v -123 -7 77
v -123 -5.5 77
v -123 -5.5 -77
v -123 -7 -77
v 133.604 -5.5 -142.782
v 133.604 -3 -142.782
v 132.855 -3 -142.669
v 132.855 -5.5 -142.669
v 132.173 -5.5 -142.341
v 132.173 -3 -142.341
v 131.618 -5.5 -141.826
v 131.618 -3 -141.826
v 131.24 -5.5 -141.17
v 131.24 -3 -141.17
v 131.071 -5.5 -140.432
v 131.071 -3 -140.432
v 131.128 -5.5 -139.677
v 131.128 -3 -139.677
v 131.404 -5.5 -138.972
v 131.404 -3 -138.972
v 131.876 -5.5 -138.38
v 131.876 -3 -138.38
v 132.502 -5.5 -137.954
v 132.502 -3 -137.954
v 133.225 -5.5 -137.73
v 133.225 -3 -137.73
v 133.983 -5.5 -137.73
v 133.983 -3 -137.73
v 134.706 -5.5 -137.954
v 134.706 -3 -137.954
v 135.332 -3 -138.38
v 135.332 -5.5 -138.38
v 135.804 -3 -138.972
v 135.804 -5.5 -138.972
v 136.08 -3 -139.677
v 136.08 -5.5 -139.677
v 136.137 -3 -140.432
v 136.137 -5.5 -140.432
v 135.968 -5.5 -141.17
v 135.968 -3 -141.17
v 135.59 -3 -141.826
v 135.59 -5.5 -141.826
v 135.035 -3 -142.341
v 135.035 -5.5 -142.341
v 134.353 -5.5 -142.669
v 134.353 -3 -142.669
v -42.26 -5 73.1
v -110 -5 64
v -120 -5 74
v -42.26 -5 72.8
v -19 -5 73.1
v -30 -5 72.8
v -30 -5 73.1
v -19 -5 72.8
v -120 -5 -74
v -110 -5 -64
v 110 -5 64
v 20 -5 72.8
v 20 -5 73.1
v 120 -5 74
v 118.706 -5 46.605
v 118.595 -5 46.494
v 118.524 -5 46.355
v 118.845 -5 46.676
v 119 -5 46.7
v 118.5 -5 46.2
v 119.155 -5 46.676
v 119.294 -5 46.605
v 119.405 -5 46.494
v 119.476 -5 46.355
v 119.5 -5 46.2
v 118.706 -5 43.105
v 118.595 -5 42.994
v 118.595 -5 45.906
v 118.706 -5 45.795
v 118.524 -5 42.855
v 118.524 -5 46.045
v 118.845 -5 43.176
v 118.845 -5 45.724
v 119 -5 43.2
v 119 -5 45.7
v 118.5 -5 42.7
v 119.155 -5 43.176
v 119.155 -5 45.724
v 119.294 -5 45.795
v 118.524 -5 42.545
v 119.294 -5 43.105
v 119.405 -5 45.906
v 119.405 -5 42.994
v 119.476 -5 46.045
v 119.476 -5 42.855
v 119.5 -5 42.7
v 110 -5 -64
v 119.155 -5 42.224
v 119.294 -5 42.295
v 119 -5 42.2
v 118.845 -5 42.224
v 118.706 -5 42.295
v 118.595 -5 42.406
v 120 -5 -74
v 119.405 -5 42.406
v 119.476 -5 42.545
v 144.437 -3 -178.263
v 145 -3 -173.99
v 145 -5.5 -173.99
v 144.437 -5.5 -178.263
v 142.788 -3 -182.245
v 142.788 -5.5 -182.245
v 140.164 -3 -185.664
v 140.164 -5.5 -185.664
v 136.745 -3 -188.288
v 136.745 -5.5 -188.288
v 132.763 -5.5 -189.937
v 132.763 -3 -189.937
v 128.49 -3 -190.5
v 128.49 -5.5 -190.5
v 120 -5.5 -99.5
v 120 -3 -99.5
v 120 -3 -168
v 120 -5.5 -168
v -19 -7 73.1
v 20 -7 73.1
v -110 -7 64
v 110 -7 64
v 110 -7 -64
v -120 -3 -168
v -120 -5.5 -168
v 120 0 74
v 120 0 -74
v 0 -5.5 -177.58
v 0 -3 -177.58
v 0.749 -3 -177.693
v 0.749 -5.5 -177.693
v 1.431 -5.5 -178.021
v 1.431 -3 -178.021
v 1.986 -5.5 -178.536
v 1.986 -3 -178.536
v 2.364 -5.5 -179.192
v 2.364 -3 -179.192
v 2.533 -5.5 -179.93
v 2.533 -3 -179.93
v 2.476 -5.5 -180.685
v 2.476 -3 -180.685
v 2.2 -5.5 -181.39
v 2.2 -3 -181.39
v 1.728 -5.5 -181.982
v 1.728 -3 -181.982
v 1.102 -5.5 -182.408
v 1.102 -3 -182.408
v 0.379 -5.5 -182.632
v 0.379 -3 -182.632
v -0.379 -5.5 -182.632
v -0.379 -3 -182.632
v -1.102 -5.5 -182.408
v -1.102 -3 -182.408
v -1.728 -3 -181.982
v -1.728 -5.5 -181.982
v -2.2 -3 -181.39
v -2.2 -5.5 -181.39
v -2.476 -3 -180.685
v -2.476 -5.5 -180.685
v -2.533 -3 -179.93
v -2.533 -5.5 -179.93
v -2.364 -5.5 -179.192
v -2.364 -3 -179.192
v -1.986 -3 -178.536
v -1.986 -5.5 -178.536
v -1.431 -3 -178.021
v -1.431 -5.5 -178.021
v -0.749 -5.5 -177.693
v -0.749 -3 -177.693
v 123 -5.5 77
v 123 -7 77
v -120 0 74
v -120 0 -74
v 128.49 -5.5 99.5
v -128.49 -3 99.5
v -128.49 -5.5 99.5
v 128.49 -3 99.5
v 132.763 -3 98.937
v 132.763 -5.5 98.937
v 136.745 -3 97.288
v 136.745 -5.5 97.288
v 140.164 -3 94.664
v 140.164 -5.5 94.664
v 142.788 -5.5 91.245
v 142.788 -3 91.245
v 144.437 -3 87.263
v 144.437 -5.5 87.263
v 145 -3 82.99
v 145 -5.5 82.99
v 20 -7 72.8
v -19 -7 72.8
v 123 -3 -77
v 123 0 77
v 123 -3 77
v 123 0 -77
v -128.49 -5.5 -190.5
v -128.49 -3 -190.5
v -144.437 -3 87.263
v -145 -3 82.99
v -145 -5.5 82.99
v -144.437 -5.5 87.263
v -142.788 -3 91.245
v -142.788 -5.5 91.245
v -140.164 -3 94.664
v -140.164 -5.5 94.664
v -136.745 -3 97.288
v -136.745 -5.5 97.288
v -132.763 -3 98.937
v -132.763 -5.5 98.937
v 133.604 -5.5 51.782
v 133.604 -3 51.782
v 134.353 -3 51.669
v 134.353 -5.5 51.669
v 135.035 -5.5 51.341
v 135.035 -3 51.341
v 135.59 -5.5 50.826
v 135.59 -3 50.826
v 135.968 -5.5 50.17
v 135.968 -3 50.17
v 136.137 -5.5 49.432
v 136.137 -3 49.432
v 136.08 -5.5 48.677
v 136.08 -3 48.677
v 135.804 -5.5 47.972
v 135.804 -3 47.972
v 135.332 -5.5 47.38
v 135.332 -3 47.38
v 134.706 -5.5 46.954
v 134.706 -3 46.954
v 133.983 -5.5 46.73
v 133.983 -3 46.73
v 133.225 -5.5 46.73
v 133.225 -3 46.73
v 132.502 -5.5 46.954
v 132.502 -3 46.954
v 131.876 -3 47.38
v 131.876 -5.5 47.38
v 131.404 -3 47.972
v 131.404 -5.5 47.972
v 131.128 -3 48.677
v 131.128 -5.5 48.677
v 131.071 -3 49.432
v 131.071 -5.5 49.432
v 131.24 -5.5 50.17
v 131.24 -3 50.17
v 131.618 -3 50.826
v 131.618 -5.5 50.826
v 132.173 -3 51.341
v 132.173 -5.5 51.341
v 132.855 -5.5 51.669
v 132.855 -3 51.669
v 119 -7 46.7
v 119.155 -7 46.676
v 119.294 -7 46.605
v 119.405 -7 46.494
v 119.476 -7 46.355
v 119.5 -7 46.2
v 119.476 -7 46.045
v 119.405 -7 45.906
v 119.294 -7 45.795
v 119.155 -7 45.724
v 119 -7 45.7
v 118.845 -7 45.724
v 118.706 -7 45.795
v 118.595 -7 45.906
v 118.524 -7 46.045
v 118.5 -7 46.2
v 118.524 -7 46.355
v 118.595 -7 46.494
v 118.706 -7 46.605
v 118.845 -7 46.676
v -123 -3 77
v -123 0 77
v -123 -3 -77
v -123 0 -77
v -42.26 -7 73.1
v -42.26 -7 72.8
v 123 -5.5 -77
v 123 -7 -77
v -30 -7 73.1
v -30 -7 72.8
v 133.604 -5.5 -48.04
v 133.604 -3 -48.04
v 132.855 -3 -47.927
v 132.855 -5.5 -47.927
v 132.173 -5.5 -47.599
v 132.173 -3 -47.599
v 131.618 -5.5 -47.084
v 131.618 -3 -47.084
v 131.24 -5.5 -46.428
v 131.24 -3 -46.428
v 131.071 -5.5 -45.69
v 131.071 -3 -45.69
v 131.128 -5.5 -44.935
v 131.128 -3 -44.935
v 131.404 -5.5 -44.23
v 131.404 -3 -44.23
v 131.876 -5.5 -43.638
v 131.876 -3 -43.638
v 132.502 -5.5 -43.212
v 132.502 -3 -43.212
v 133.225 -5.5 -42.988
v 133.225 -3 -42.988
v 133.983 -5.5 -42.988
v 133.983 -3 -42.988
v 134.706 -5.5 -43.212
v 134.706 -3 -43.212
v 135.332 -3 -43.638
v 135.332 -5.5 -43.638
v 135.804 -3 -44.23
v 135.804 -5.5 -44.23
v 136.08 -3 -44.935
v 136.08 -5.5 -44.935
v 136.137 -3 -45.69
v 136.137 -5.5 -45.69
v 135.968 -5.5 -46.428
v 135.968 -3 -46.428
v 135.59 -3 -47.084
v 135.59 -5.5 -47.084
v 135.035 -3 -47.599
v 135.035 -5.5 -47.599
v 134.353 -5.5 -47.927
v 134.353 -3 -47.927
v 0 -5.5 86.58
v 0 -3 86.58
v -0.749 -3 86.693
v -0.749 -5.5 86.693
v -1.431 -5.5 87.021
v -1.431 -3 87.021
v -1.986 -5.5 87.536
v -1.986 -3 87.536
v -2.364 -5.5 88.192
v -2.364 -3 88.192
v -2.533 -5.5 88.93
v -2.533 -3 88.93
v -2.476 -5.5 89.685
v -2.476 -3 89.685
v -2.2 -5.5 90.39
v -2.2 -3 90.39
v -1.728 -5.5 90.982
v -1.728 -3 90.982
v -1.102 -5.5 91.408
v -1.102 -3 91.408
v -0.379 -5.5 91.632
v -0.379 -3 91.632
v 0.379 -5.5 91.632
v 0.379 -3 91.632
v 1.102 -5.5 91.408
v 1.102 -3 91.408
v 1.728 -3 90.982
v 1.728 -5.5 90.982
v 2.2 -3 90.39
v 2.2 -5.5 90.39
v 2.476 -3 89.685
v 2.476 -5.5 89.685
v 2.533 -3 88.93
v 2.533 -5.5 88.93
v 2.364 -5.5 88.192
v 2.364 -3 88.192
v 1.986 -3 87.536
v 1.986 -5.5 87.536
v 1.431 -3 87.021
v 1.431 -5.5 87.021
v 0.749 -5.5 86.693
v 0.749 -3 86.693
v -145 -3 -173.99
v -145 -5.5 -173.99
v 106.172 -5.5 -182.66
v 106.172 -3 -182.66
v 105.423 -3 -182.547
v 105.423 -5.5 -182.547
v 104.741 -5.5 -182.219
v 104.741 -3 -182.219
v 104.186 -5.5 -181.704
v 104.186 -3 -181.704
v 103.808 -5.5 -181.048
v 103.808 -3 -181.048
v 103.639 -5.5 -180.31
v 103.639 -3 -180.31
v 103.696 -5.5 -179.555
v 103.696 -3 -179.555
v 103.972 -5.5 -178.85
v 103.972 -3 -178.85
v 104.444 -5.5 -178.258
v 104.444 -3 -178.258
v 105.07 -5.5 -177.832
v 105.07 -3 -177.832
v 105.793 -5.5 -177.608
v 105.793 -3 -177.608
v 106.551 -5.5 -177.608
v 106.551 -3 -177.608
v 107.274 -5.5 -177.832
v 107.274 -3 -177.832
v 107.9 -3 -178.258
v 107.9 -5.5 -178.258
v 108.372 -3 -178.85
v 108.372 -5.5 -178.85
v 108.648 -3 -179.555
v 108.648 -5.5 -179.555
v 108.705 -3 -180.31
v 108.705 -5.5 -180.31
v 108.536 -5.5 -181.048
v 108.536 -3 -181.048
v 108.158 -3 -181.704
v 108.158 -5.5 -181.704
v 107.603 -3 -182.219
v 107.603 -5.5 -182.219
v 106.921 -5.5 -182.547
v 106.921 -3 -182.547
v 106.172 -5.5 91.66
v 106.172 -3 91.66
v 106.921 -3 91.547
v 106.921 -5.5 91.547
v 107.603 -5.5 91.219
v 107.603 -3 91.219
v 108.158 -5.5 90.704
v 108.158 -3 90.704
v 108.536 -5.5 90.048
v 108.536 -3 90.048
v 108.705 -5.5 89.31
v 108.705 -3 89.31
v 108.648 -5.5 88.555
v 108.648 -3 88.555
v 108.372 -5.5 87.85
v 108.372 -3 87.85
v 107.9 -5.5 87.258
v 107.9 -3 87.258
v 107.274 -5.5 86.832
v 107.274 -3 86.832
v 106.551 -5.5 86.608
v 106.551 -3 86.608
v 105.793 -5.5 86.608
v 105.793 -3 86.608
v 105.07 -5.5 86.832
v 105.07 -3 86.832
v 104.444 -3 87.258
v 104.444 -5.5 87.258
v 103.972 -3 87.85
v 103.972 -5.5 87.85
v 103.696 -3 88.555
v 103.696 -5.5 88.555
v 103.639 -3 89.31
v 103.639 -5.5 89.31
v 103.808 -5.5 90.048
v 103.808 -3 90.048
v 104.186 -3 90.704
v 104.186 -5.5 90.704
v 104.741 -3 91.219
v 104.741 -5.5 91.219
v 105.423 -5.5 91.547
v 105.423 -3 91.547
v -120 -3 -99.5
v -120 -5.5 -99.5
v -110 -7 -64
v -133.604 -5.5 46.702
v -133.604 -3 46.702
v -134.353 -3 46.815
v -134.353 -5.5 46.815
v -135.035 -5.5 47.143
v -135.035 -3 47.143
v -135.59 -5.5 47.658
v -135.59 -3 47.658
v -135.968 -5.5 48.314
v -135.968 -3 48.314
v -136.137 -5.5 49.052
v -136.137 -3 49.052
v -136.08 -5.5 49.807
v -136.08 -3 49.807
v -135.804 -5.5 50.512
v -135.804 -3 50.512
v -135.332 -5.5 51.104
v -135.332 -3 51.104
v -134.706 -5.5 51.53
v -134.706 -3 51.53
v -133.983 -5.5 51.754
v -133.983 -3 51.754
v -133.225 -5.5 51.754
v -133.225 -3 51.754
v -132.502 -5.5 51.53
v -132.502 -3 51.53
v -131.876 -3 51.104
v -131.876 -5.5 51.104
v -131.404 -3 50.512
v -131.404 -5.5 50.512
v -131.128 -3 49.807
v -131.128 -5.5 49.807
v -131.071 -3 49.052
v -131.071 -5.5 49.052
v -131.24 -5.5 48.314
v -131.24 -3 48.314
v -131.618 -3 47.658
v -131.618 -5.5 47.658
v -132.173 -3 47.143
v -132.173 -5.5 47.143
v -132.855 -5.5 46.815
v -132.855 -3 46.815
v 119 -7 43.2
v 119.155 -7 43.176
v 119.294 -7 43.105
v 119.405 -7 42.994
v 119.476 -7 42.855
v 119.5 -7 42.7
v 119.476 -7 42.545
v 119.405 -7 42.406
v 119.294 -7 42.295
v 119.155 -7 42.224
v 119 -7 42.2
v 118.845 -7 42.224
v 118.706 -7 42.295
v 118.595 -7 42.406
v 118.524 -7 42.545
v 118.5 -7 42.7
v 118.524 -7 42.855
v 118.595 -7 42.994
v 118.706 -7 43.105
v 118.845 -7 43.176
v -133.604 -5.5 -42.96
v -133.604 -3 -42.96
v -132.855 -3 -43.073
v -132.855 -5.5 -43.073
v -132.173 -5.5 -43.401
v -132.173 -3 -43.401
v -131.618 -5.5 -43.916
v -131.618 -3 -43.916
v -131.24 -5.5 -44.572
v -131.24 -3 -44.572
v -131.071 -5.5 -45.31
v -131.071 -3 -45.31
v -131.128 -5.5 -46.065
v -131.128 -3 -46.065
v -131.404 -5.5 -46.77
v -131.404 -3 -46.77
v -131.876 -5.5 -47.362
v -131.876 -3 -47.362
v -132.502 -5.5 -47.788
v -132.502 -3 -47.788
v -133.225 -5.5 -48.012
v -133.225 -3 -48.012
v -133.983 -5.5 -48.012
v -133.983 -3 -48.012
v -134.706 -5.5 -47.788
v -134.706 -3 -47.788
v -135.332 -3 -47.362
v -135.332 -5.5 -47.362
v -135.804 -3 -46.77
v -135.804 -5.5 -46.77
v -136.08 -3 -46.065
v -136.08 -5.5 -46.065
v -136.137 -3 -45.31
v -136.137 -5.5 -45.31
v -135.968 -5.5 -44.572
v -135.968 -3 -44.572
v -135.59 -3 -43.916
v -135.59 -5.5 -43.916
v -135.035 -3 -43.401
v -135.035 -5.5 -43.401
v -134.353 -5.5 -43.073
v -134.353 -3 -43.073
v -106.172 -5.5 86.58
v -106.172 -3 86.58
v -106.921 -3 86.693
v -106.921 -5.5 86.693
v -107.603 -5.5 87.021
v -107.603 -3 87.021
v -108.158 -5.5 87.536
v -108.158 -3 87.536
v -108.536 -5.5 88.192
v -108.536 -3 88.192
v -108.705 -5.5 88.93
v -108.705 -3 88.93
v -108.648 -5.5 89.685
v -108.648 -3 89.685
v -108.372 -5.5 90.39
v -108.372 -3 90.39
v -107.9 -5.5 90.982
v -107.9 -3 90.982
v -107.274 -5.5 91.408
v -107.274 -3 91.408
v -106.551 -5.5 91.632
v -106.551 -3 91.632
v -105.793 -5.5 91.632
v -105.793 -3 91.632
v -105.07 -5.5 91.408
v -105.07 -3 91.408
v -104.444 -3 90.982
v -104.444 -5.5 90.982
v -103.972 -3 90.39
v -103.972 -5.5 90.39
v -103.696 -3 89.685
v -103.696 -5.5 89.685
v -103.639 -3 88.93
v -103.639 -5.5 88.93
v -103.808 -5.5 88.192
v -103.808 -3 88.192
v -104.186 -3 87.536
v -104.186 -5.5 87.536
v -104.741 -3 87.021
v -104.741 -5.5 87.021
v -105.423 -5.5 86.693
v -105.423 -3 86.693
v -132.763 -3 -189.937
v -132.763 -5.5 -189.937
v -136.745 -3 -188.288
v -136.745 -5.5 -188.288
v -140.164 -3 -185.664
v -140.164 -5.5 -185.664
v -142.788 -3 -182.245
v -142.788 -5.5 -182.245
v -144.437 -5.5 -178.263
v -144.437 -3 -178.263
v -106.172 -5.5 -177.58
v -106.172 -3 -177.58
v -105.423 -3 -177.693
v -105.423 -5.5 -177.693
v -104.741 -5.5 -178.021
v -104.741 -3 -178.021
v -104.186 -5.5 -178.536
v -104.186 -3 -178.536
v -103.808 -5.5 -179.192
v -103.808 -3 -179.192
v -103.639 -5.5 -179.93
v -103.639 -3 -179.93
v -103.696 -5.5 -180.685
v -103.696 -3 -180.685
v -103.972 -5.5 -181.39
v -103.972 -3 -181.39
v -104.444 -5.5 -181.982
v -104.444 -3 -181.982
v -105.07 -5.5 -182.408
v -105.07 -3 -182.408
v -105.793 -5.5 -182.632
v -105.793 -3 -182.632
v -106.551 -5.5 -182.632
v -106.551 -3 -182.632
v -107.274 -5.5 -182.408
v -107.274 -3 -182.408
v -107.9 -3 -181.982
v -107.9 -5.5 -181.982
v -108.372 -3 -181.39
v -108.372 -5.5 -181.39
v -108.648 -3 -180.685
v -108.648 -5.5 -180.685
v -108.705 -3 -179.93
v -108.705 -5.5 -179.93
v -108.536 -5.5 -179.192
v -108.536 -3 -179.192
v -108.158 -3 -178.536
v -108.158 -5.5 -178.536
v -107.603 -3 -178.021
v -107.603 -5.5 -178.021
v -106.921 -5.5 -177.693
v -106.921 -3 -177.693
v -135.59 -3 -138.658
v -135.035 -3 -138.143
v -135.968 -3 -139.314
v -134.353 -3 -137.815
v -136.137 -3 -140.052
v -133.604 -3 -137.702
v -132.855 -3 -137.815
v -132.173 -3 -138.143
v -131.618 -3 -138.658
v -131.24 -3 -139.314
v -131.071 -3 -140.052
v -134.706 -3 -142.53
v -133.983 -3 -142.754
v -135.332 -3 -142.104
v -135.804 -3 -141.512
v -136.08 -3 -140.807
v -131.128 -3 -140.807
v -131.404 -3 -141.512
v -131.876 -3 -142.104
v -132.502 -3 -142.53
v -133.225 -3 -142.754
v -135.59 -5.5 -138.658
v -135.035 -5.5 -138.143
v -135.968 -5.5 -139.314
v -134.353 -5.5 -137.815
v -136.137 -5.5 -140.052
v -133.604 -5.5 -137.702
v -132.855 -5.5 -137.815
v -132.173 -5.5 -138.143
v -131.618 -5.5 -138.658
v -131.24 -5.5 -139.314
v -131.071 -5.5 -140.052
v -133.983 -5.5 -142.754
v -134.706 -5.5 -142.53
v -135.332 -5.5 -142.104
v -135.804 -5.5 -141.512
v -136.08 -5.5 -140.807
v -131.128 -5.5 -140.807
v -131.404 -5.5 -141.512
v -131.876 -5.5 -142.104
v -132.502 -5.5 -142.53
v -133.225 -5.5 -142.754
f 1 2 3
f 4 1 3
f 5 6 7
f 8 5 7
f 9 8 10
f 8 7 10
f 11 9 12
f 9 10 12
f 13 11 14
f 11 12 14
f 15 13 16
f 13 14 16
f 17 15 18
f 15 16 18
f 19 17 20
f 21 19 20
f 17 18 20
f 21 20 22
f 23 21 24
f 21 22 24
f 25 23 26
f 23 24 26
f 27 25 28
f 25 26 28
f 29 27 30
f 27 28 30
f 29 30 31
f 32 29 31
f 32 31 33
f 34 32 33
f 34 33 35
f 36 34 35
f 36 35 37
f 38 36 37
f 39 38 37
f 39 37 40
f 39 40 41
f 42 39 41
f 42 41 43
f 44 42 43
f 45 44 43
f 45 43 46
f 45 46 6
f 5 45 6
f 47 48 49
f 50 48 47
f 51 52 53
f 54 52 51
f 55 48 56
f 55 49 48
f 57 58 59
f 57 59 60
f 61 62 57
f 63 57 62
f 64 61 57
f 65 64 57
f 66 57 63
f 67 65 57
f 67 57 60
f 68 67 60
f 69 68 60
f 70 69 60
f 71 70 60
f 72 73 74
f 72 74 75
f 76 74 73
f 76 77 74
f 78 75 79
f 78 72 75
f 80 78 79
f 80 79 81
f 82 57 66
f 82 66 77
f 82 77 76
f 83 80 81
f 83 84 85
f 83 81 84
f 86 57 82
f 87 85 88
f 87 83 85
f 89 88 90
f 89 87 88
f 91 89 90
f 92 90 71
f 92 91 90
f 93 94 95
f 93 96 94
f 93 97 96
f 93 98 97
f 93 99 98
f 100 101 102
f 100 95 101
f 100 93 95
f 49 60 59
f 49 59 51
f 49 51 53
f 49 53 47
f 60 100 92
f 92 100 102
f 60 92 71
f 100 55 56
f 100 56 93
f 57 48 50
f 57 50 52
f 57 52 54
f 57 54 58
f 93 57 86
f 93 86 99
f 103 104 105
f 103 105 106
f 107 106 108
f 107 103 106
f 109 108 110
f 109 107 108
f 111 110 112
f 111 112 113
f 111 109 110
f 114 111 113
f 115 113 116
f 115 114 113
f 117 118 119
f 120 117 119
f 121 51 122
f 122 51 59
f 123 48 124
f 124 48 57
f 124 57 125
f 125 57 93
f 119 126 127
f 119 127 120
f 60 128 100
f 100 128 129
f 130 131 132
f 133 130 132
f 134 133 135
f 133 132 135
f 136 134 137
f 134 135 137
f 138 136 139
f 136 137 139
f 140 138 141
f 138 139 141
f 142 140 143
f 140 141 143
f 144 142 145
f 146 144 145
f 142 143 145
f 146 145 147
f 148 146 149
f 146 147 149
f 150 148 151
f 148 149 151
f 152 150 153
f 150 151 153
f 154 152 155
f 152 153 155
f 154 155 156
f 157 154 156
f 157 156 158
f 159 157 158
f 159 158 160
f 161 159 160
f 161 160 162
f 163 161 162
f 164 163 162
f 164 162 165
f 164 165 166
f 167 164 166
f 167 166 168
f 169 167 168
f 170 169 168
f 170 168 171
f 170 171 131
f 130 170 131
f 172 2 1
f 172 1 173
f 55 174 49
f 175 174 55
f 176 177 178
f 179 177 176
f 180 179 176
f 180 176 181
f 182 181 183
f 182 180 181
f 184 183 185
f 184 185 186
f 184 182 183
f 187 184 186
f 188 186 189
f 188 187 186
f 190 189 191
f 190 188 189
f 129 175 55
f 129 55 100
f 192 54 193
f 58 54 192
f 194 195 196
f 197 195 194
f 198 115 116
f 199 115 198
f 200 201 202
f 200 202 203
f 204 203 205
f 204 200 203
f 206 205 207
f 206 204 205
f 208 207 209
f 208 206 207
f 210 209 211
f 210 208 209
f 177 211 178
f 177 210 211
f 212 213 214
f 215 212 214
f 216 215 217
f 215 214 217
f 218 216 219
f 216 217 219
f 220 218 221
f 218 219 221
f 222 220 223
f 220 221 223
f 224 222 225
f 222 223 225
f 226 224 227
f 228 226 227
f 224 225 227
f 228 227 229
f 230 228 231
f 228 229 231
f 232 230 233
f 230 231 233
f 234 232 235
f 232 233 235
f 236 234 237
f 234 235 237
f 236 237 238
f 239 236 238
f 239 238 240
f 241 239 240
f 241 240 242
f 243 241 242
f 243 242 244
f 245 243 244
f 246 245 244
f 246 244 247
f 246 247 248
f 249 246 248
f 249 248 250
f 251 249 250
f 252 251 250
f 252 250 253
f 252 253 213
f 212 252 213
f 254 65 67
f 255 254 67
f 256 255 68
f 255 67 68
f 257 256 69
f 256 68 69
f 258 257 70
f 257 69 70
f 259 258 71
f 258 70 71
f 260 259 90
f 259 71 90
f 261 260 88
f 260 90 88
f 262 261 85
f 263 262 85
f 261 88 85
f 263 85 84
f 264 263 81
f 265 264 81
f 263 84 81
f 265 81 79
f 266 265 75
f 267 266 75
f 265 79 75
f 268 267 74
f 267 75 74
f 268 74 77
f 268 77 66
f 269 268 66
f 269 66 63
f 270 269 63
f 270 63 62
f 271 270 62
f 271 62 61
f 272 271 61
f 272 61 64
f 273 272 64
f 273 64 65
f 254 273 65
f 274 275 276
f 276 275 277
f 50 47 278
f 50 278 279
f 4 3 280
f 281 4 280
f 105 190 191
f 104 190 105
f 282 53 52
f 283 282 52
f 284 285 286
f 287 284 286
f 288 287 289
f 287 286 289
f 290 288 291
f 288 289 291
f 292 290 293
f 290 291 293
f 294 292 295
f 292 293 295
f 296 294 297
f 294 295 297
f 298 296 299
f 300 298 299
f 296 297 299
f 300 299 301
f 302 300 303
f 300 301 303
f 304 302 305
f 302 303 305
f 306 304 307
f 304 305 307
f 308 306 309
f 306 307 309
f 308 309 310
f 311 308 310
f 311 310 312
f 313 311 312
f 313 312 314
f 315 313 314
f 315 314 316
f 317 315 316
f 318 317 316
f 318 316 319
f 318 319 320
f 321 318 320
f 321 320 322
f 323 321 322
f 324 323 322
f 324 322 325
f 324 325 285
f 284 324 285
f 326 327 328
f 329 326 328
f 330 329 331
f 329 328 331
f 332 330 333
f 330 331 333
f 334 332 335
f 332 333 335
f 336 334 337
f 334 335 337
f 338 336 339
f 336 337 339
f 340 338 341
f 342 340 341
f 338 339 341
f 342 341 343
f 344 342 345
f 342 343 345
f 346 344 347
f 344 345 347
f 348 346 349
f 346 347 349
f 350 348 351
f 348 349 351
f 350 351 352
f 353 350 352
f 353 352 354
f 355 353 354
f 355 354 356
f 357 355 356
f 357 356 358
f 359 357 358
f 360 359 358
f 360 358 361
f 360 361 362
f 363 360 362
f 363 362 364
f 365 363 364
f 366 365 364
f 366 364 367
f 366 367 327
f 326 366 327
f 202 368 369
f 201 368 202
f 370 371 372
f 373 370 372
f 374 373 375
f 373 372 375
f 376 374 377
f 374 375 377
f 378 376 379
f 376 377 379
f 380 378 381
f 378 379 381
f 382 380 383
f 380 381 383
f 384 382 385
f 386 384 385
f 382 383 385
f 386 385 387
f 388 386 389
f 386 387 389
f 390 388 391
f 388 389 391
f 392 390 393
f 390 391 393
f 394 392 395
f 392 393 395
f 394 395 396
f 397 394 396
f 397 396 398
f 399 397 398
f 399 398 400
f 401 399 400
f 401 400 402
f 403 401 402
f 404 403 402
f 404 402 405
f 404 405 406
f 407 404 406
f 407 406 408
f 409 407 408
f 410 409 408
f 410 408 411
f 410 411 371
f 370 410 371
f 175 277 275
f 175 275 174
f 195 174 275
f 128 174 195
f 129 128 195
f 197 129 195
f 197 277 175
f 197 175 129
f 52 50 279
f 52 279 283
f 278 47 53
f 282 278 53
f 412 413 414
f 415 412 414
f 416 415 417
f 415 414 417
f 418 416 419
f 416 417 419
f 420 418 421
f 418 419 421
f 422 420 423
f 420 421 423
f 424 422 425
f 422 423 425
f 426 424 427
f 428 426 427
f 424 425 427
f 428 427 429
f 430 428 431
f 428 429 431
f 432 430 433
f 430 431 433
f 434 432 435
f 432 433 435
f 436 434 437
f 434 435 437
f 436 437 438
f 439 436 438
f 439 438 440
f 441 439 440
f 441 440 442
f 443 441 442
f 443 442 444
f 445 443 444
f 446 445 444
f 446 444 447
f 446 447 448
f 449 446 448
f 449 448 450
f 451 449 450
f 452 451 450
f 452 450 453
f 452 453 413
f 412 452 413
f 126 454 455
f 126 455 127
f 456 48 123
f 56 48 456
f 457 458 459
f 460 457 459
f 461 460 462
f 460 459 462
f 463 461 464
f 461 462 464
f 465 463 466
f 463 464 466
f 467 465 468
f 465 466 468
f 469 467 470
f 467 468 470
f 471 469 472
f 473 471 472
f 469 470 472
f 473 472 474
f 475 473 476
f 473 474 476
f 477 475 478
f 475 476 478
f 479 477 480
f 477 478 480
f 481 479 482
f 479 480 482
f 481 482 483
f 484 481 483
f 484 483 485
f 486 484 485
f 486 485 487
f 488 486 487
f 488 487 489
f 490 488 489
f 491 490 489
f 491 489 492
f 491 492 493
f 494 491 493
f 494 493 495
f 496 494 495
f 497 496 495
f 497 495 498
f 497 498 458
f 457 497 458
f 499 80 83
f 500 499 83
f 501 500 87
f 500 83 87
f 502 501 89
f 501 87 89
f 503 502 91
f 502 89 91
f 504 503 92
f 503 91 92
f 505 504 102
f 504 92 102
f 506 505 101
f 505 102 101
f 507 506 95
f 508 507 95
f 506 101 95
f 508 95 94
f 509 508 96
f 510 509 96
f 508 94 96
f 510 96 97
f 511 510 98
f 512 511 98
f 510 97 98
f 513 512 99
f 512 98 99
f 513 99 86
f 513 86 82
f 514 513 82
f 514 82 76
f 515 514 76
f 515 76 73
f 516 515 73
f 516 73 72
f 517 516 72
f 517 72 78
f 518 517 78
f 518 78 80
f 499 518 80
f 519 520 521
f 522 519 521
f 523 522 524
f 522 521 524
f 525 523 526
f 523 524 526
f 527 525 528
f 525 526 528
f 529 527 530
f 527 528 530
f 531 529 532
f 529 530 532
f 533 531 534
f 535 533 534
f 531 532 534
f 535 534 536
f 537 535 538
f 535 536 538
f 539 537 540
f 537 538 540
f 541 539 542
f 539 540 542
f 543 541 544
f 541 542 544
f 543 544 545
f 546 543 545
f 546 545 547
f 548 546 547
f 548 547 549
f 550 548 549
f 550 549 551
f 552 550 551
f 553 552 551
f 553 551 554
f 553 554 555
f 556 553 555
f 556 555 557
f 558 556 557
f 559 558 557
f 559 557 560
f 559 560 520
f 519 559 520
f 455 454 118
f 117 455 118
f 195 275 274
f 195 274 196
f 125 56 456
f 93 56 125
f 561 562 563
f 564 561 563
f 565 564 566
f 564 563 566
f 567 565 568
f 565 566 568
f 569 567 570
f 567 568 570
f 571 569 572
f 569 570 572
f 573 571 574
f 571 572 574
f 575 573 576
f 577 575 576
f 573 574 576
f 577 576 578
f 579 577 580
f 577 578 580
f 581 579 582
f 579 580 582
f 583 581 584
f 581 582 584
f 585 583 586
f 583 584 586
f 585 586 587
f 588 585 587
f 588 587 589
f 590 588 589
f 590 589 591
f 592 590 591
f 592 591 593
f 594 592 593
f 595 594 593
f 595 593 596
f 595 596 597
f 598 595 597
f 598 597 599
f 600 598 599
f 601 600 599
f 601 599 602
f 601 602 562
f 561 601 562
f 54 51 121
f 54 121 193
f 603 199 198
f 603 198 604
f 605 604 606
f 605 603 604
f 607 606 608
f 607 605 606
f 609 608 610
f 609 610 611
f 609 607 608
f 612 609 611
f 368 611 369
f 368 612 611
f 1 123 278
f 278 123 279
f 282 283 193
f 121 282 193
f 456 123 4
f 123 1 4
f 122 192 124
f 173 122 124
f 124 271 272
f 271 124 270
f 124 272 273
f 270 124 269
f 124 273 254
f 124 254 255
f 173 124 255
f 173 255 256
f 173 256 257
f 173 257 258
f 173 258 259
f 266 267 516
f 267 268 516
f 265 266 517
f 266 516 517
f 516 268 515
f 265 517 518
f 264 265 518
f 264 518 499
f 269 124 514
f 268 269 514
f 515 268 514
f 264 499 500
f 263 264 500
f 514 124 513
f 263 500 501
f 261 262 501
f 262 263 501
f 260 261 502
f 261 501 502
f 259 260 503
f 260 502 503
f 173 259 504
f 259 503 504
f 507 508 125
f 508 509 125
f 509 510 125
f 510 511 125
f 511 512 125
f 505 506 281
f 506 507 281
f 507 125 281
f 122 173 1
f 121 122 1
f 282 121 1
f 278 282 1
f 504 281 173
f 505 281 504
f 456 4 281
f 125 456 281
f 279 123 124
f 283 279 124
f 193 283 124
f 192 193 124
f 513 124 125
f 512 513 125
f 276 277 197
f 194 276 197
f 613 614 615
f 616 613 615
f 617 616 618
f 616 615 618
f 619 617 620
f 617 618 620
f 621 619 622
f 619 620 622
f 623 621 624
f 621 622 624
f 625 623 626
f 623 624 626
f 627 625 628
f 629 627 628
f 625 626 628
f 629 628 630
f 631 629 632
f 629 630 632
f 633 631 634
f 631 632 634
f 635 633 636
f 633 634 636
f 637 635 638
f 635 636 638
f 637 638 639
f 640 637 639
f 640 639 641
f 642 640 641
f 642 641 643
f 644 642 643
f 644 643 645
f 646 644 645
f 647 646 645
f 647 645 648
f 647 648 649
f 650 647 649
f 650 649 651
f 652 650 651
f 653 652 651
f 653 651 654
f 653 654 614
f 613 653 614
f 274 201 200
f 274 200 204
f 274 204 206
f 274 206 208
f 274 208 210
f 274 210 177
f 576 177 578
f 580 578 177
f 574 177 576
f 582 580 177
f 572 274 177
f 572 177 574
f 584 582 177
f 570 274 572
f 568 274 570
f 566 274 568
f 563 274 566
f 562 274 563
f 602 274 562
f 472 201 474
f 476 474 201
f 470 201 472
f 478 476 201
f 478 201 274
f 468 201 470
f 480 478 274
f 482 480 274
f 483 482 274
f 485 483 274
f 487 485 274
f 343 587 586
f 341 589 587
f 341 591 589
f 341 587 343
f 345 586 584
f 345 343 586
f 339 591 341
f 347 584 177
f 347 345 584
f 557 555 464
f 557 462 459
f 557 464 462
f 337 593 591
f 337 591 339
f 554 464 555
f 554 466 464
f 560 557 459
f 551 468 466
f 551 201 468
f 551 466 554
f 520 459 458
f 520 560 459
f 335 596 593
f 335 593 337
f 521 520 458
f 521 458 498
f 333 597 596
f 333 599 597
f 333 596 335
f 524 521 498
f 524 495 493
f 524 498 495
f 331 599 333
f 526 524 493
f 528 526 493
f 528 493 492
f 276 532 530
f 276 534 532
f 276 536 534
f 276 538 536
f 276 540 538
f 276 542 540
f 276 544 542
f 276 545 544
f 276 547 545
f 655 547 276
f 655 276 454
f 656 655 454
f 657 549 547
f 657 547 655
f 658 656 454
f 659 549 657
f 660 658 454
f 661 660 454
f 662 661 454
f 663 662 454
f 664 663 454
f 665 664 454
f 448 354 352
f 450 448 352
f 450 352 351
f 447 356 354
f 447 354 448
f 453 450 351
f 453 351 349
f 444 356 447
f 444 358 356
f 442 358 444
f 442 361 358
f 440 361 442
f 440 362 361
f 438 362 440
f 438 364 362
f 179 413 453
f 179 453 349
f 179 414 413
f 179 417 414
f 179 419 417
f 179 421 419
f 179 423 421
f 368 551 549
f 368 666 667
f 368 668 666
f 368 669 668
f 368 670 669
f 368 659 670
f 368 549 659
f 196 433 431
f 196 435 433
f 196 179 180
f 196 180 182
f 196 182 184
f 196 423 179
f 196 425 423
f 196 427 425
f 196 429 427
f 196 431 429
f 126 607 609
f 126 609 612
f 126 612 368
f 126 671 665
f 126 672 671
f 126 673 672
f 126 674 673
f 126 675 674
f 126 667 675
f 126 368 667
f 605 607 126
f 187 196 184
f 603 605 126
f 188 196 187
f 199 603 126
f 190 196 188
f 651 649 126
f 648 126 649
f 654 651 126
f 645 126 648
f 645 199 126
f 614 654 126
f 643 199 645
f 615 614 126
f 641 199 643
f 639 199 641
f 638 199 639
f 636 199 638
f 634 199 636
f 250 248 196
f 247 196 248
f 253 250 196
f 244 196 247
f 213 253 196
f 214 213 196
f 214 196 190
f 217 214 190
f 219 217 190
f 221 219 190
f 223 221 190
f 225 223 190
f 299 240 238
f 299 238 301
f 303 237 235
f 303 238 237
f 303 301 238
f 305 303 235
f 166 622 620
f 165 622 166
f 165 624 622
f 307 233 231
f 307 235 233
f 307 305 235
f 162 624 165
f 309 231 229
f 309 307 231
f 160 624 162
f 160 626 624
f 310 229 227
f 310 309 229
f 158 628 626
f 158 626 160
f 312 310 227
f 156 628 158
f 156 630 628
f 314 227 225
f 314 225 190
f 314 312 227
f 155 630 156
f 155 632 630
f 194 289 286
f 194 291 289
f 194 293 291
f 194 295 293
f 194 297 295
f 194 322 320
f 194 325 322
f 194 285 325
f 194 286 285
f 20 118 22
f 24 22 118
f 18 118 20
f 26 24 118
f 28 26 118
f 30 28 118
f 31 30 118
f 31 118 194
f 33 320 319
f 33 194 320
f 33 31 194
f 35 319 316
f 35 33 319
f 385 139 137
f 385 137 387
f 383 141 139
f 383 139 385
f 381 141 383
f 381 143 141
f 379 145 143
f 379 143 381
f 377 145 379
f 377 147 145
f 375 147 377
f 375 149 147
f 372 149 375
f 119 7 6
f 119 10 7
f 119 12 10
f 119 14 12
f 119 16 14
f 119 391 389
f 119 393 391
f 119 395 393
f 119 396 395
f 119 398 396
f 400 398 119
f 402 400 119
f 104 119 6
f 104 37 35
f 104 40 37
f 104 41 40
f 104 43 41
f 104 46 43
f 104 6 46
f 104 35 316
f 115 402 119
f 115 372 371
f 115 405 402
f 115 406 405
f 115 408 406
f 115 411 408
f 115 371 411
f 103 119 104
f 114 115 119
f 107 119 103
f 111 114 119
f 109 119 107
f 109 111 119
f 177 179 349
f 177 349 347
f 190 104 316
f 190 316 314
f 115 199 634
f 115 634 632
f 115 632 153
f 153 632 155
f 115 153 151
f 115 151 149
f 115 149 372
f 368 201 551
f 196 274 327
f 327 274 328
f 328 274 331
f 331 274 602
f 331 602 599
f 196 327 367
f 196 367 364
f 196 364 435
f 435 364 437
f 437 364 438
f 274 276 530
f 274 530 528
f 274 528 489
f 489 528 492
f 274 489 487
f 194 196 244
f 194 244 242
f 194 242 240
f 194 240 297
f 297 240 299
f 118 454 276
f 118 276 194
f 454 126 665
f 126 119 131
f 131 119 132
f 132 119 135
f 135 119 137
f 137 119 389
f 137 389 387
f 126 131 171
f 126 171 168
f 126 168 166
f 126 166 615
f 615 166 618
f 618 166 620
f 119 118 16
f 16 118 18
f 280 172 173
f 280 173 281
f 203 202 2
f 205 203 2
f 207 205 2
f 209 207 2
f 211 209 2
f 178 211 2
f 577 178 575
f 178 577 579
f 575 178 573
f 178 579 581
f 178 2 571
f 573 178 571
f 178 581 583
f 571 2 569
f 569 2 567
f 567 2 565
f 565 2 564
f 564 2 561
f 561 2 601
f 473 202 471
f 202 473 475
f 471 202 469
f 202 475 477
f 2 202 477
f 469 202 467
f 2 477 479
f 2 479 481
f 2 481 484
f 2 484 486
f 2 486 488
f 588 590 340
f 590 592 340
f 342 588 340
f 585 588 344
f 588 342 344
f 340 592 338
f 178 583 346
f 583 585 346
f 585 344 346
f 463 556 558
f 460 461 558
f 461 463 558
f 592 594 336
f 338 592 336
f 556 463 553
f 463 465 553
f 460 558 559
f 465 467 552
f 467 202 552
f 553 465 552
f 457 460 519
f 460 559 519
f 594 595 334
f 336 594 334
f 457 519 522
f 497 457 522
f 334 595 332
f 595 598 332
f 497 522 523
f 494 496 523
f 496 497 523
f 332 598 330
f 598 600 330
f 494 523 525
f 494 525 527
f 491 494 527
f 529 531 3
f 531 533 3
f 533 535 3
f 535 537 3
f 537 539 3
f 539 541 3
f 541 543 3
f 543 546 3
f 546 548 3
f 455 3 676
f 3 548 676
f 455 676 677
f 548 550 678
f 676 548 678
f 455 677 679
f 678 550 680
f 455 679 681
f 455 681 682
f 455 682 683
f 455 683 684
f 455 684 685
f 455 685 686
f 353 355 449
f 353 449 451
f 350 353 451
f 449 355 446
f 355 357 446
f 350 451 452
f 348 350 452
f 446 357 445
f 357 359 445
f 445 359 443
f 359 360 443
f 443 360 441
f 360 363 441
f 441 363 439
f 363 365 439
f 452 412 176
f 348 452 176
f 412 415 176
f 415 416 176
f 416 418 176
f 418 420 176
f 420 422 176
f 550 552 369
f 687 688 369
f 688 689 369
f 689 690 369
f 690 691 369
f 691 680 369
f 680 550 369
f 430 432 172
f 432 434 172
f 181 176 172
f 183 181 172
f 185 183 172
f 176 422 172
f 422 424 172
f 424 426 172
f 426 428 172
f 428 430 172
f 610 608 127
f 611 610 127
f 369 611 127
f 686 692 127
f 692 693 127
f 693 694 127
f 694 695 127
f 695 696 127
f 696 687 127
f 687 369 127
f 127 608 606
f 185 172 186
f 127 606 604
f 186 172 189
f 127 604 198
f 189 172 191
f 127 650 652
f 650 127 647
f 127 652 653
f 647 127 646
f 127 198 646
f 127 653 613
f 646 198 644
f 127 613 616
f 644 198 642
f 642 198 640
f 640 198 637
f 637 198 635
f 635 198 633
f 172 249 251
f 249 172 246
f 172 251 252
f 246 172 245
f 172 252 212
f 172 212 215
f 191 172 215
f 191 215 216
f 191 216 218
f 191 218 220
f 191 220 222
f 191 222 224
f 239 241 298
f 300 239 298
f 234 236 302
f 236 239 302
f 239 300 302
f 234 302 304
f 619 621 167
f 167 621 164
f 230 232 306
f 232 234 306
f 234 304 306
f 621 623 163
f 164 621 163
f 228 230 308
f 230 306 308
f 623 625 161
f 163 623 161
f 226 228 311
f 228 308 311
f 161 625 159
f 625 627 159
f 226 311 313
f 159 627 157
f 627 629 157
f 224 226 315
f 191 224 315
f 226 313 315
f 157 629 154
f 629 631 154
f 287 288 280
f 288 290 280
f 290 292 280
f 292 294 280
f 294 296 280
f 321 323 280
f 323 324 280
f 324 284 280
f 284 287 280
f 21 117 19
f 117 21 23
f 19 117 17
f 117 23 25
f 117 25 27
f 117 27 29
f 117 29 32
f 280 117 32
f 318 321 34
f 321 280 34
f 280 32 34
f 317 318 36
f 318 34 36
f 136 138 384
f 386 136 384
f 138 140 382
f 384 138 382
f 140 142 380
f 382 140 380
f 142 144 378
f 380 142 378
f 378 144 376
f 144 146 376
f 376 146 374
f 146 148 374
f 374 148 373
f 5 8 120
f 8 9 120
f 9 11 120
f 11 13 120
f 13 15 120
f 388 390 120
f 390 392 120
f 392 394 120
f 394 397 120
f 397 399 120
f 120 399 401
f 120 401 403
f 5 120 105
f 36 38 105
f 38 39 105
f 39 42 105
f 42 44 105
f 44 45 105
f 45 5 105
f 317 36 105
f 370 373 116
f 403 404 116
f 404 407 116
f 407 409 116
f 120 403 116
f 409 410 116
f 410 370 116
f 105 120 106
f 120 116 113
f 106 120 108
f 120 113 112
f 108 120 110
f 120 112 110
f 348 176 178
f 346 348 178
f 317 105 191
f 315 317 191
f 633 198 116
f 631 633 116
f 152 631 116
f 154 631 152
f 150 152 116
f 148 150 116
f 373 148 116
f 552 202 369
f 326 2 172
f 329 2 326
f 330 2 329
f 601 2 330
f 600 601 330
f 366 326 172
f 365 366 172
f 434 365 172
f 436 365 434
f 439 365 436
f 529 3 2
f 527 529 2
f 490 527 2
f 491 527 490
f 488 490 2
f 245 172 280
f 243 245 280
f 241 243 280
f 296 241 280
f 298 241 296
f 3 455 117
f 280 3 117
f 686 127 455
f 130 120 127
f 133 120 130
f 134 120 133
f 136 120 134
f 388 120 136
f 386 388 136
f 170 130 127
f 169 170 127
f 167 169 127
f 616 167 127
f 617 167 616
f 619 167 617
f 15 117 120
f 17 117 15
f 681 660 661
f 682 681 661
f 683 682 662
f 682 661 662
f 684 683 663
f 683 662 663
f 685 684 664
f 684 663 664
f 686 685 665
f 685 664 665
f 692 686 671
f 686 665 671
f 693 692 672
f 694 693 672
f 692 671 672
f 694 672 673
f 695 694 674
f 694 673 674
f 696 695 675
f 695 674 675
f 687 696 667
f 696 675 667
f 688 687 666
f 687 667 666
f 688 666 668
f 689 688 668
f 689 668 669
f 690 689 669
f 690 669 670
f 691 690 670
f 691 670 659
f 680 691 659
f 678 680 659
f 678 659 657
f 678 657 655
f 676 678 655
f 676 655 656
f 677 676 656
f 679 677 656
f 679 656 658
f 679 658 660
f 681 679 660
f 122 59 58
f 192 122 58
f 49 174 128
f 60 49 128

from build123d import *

# Parameters (mm, degrees)
SKETCH1_W           = 246
SKETCH1_H           = 154
BOSS_EXTRUDE1_DEPTH = 7
SKETCH2_W           = 240
SKETCH2_H           = 148
CUT_EXTRUDE1_DEPTH  = 5
SKETCH3_W           = 220
SKETCH3_H           = 128
CUT_EXTRUDE2_DEPTH  = 5
BOSS_EXTRUDE2_START = -3
SKETCH6_W           = 240
SKETCH6_H           = 68.5
SKETCH6_W_2         = 246
SKETCH6_H_2         = 154
BOSS_EXTRUDE2_DEPTH = 2.5
SKETCH8_W           = 39
SKETCH8_H           = 0.3
SKETCH8_W_2         = 12.26
CUT_EXTRUDE5_DEPTH  = 5
SKETCH9_R           = 0.5
CUT_EXTRUDE6_DEPTH  = 5
SKETCH10_R          = 2.54
CUT_EXTRUDE7_DEPTH  = 5


with BuildPart() as part:
    # Sketch1 → Boss-Extrude1 (new body)
    with BuildSketch(Plane(origin=(0, 0, 0), x_dir=(1, 0, 0), z_dir=(0, 1, 0))):
        Rectangle(SKETCH1_W, SKETCH1_H)
    extrude(amount=-BOSS_EXTRUDE1_DEPTH)

    # Sketch2 → Cut-Extrude1 (cut)
    with BuildSketch(Plane(origin=(0, 0, 0), x_dir=(1, 0, 0), z_dir=(0, 1, 0))):
        Rectangle(SKETCH2_W, SKETCH2_H)
    extrude(amount=-CUT_EXTRUDE1_DEPTH, mode=Mode.SUBTRACT)

    # Sketch3 → Cut-Extrude2 (cut)
    with BuildSketch(Plane(origin=(0, -5, 0), x_dir=(1, 0, 0), z_dir=(0, 1, 0))):
        Rectangle(SKETCH3_W, SKETCH3_H)
    extrude(amount=-CUT_EXTRUDE2_DEPTH, mode=Mode.SUBTRACT)

    # Sketch6 → Boss-Extrude2 (add)
    with BuildSketch(Plane(origin=(0, 0, 0), x_dir=(1, 0, 0), z_dir=(0, 1, 0)).offset(BOSS_EXTRUDE2_START)):
        with BuildLine():
            Line((-128.49, -99.5), (128.49, -99.5))
            ThreePointArc((128.49, -99.5), (140.164332957, -94.664332957), (145, -82.99))
            Line((145, -82.99), (145, 173.99))
            ThreePointArc((145, 173.99), (140.164332957, 185.664332957), (128.49, 190.5))
            Line((128.49, 190.5), (-128.49, 190.5))
            ThreePointArc((-128.49, 190.5), (-140.164332957, 185.664332957), (-145, 173.99))
            Line((-145, 173.99), (-145, -82.99))
            ThreePointArc((-145, -82.99), (-140.164332957, -94.664332957), (-128.49, -99.5))
        make_face()
        with Locations((0, 133.75)):
            Rectangle(SKETCH6_W, SKETCH6_H, mode=Mode.SUBTRACT)
        Rectangle(SKETCH6_W_2, SKETCH6_H_2, mode=Mode.SUBTRACT)
    extrude(amount=-BOSS_EXTRUDE2_DEPTH)

    # Sketch8 → Cut-Extrude5 (cut)
    with BuildSketch(Plane(origin=(0, -5, 0), x_dir=(1, 0, 0), z_dir=(0, 1, 0))):
        with Locations((0.5, -72.95)):
            Rectangle(SKETCH8_W, SKETCH8_H)
        with Locations((-36.13, -72.95)):
            Rectangle(SKETCH8_W_2, SKETCH8_H)
    extrude(amount=-CUT_EXTRUDE5_DEPTH, mode=Mode.SUBTRACT)

    # Sketch9 → Cut-Extrude6 (cut)
    with BuildSketch(Plane(origin=(0, -5, 0), x_dir=(1, 0, 0), z_dir=(0, 1, 0))):
        with Locations(Location((119, -46.2, 0), (0, 0, 270))):
            Circle(SKETCH9_R)
        with Locations(Location((119, -42.7, 0), (0, 0, 270))):
            Circle(SKETCH9_R)
    extrude(amount=-CUT_EXTRUDE6_DEPTH, mode=Mode.SUBTRACT)

    # Sketch10 → Cut-Extrude7 (cut)
    with BuildSketch(Plane(origin=(0, -3, 0), x_dir=(1, 0, 0), z_dir=(0, 1, 0))):
        with Locations(Location((-133.604, 140.242, 0), (0, 0, 270))):
            Circle(SKETCH10_R)
        with Locations(Location((-106.172, 180.12, 0), (0, 0, 270))):
            Circle(SKETCH10_R)
        with Locations(Location((-133.604, -49.242, 0), (0, 0, 90))):
            Circle(SKETCH10_R)
        with Locations(Location((-133.604, 45.5, 0), (0, 0, 270))):
            Circle(SKETCH10_R)
        with Locations(Location((0, 180.12, 0), (0, 0, 270))):
            Circle(SKETCH10_R)
        with Locations(Location((0, -89.12, 0), (0, 0, 90))):
            Circle(SKETCH10_R)
        with Locations(Location((-106.172, -89.12, 0), (0, 0, 90))):
            Circle(SKETCH10_R)
        with Locations(Location((106.172, -89.12, 0), (0, 0, 270))):
            Circle(SKETCH10_R)
        with Locations(Location((133.604, 45.5, 0), (0, 0, 90))):
            Circle(SKETCH10_R)
        with Locations(Location((133.604, -49.242, 0), (0, 0, 270))):
            Circle(SKETCH10_R)
        with Locations(Location((106.172, 180.12, 0), (0, 0, 90))):
            Circle(SKETCH10_R)
        with Locations(Location((133.604, 140.242, 0), (0, 0, 90))):
            Circle(SKETCH10_R)
    extrude(amount=-CUT_EXTRUDE7_DEPTH, mode=Mode.SUBTRACT)


solid = part.part
